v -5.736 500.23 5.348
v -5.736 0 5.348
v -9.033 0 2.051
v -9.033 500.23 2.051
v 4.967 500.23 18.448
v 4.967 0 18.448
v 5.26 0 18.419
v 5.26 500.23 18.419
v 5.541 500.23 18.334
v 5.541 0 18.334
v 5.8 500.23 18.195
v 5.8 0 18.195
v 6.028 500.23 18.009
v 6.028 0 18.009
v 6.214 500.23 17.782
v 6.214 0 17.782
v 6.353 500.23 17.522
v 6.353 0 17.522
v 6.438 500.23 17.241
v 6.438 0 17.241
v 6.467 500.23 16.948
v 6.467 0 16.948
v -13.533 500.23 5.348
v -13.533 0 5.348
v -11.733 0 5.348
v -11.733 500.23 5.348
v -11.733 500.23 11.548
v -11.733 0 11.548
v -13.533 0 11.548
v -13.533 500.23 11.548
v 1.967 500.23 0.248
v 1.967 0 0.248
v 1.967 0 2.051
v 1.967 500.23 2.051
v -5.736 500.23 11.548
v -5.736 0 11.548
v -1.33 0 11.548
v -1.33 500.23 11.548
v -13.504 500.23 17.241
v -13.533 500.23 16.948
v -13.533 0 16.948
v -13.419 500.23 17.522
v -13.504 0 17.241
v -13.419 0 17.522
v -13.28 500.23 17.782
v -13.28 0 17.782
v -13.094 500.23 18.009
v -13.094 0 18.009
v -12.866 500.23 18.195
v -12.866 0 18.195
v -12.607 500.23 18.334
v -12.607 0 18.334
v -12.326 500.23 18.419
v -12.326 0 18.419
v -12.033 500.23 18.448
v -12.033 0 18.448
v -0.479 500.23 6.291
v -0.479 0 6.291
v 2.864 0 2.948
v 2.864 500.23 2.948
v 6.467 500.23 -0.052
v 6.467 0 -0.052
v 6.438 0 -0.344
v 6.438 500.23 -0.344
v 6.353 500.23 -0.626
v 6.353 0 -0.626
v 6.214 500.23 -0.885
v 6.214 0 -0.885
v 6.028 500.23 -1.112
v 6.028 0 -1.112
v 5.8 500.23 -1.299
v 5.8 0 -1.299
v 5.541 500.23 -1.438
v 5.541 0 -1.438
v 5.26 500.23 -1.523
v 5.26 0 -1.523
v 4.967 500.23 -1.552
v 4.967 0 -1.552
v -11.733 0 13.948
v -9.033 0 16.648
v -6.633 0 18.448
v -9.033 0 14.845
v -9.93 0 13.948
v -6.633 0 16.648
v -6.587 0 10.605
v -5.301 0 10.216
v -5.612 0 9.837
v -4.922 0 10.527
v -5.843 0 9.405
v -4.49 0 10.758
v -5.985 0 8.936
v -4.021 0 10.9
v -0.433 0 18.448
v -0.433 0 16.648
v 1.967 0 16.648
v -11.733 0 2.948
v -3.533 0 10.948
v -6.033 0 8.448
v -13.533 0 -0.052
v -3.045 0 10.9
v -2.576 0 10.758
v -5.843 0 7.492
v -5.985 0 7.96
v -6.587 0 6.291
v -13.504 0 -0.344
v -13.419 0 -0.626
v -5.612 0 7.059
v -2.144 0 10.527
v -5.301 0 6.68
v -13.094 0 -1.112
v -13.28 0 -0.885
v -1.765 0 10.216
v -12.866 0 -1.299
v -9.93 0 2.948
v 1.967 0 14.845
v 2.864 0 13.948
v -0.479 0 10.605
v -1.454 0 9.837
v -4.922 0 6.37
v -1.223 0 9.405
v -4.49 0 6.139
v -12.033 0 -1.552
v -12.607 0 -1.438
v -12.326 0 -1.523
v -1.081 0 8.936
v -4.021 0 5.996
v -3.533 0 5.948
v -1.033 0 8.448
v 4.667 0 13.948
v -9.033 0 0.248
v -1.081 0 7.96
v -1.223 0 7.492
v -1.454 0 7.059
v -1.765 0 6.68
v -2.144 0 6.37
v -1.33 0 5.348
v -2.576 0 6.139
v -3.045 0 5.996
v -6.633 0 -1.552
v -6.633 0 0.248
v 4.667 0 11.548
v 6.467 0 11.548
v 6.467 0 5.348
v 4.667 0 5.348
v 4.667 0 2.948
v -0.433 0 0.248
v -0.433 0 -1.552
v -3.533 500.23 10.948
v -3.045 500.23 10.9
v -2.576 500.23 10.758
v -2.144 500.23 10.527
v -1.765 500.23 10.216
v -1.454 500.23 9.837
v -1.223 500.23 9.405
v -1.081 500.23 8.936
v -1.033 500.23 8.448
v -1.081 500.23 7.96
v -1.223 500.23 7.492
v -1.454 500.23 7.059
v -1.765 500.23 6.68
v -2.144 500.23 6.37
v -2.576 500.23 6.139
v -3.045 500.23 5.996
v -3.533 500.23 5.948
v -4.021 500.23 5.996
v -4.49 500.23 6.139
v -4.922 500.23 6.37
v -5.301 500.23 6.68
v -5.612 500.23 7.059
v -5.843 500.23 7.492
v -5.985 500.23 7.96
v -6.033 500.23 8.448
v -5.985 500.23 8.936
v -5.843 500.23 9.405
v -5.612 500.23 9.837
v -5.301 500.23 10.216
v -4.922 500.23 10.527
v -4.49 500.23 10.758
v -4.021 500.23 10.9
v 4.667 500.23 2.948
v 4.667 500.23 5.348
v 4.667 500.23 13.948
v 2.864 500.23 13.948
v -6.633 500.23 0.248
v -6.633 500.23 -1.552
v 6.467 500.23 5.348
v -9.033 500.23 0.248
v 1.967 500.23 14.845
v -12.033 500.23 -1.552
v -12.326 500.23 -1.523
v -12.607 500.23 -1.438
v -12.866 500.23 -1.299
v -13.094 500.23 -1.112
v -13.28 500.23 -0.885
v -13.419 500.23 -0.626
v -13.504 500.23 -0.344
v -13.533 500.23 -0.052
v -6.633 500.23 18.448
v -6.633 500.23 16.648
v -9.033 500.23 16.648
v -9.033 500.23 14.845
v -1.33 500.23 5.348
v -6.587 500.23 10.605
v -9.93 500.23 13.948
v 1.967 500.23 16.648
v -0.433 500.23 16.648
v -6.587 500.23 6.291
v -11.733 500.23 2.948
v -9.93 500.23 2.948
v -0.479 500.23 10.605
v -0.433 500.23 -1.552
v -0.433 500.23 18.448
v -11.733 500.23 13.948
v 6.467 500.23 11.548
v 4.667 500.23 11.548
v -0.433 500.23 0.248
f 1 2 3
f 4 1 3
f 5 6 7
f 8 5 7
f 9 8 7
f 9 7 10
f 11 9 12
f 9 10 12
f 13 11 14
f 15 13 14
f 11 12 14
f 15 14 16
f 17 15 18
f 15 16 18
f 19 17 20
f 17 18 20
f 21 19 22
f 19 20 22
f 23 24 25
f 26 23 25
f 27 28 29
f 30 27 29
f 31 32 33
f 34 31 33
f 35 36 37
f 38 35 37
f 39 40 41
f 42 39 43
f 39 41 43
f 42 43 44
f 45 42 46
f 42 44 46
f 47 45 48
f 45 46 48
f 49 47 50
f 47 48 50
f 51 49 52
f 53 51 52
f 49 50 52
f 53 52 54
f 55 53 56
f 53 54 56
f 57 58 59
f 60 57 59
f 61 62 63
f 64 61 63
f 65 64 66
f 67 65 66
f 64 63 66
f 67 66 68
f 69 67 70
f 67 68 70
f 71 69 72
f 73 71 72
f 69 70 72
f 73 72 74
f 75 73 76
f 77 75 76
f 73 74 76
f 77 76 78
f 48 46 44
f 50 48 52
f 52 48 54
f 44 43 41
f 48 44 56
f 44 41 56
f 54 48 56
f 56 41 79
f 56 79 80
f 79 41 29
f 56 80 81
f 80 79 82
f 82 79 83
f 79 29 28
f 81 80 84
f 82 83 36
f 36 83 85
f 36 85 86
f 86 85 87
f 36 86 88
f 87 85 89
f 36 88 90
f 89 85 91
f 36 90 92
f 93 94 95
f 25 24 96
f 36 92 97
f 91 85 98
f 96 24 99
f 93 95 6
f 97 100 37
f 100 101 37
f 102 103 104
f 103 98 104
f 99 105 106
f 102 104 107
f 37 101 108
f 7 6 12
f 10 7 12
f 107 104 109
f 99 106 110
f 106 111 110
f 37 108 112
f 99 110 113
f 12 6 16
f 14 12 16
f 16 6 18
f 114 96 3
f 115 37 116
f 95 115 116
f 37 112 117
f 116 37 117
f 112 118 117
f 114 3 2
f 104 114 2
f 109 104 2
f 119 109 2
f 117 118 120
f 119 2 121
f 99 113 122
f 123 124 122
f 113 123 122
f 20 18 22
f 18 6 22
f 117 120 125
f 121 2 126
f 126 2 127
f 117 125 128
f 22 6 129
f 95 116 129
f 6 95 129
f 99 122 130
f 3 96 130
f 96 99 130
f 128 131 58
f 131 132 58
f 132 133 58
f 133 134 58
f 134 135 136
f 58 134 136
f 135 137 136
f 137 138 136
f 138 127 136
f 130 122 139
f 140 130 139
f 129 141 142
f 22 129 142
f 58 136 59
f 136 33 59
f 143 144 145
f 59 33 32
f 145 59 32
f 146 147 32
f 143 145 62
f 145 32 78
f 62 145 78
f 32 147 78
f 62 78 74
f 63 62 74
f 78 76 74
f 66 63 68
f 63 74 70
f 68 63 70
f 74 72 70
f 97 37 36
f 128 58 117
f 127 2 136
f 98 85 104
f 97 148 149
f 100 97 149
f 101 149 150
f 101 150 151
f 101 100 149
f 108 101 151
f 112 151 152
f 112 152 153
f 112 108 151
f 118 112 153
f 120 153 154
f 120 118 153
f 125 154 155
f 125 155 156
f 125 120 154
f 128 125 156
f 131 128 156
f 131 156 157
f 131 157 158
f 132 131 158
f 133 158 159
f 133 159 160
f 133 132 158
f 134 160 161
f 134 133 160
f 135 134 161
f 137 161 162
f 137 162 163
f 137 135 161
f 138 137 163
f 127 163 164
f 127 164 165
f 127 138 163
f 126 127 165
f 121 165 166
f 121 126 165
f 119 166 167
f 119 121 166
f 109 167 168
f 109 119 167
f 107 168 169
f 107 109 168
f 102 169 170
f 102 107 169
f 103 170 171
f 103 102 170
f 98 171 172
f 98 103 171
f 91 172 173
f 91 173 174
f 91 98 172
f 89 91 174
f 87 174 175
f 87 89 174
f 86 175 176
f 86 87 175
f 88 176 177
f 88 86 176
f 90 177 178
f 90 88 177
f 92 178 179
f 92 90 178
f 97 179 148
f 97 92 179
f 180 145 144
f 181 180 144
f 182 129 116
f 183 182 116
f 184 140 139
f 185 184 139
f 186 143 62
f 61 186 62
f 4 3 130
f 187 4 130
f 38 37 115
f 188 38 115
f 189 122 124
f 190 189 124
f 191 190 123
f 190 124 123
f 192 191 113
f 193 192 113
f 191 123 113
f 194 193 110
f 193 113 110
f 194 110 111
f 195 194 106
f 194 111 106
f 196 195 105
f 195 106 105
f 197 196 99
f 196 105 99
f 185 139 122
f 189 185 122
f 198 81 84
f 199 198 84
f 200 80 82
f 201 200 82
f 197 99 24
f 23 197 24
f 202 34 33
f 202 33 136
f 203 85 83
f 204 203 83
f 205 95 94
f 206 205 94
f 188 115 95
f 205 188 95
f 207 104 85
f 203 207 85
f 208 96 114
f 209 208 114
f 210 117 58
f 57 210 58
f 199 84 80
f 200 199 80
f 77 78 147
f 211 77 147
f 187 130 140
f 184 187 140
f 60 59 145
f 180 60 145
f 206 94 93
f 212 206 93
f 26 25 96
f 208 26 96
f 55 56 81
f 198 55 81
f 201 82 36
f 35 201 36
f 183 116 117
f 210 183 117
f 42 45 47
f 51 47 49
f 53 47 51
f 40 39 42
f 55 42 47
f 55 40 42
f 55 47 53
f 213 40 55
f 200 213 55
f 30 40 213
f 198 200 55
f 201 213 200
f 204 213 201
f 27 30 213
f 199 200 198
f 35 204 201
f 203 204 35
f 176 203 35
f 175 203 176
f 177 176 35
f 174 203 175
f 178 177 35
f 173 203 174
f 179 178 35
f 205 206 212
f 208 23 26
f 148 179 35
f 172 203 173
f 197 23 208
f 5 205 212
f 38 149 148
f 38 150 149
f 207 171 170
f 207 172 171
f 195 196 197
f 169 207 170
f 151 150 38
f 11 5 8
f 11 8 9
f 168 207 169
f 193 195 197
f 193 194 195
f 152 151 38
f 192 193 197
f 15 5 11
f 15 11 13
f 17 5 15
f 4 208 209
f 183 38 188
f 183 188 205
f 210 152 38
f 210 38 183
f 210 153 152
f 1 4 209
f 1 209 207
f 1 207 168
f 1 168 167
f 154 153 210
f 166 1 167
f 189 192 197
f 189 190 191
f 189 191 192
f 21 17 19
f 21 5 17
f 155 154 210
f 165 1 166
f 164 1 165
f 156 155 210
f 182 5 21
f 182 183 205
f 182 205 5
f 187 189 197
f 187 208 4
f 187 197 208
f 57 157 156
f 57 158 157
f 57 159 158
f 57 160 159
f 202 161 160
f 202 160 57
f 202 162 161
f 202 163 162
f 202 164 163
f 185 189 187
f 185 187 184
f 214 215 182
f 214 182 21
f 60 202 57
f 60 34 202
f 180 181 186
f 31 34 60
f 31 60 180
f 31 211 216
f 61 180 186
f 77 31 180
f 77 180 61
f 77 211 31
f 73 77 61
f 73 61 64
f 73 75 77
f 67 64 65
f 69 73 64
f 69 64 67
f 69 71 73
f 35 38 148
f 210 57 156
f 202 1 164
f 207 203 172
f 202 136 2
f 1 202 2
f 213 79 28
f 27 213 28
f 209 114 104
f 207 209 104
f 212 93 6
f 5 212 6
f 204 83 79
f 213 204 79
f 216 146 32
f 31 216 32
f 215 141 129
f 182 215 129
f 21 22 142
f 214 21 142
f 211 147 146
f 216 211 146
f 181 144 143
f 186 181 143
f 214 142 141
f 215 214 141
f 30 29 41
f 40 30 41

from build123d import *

# Parameters (mm, degrees)
SKETCH_1_R      = 2.5
EXTRUDE_1_DEPTH = 500.23


with BuildPart() as part:
    # 草图1 → 凸台-拉伸1 (new body)
    with BuildSketch(Plane(origin=(0, 0, 0), x_dir=(1, 0, 0), z_dir=(0, 1, 0))):
        with BuildLine():
            Line((-11.732893528, -11.548223653), (-13.532893528, -11.548223653))
            Line((-13.532893528, -11.548223653), (-13.532893528, -16.948223653))
            ThreePointArc((-13.532893528, -16.948223653), (-13.093553699, -18.008883825), (-12.032893528, -18.448223653))
            Line((-12.032893528, -18.448223653), (-6.632893528, -18.448223653))
            Line((-6.632893528, -18.448223653), (-6.632893528, -16.648223653))
            Line((-6.632893528, -16.648223653), (-9.032893528, -16.648223653))
            Line((-9.032893528, -16.648223653), (-9.032893528, -14.845273808))
            Line((-9.032893528, -14.845273808), (-5.735843372, -11.548223653))
            Line((-5.735843372, -11.548223653), (-1.329943683, -11.548223653))
            Line((-1.329943683, -11.548223653), (1.967106472, -14.845273808))
            Line((1.967106472, -14.845273808), (1.967106472, -16.648223653))
            Line((1.967106472, -16.648223653), (-0.432893528, -16.648223653))
            Line((-0.432893528, -16.648223653), (-0.432893528, -18.448223653))
            Line((-0.432893528, -18.448223653), (4.967106472, -18.448223653))
            ThreePointArc((4.967106472, -18.448223653), (6.027766644, -18.008883825), (6.467106472, -16.948223653))
            Line((6.467106472, -16.948223653), (6.467106472, -11.548223653))
            Line((6.467106472, -11.548223653), (4.667106472, -11.548223653))
            Line((4.667106472, -11.548223653), (4.667106472, -13.948223653))
            Line((4.667106472, -13.948223653), (2.864156628, -13.948223653))
            Line((2.864156628, -13.948223653), (-0.478766507, -10.605300518))
            Line((-0.478766507, -10.605300518), (-0.478766507, -6.291146788))
            Line((-0.478766507, -6.291146788), (2.864156628, -2.948223653))
            Line((2.864156628, -2.948223653), (4.667106472, -2.948223653))
            Line((4.667106472, -2.948223653), (4.667106472, -5.348223653))
            Line((4.667106472, -5.348223653), (6.467106472, -5.348223653))
            Line((6.467106472, -5.348223653), (6.467106472, 0.051776347))
            ThreePointArc((6.467106472, 0.051776347), (6.027766644, 1.112436519), (4.967106472, 1.551776347))
            Line((4.967106472, 1.551776347), (-0.432893528, 1.551776347))
            Line((-0.432893528, 1.551776347), (-0.432893528, -0.248223653))
            Line((-0.432893528, -0.248223653), (1.967106472, -0.248223653))
            Line((1.967106472, -0.248223653), (1.967106472, -2.051173498))
            Line((1.967106472, -2.051173498), (-1.329943683, -5.348223653))
            Line((-1.329943683, -5.348223653), (-5.735843372, -5.348223653))
            Line((-5.735843372, -5.348223653), (-9.032893528, -2.051173498))
            Line((-9.032893528, -2.051173498), (-9.032893528, -0.248223653))
            Line((-9.032893528, -0.248223653), (-6.632893528, -0.248223653))
            Line((-6.632893528, -0.248223653), (-6.632893528, 1.551776347))
            Line((-6.632893528, 1.551776347), (-12.032893528, 1.551776347))
            ThreePointArc((-12.032893528, 1.551776347), (-13.093553699, 1.112436519), (-13.532893528, 0.051776347))
            Line((-13.532893528, 0.051776347), (-13.532893528, -5.348223653))
            Line((-13.532893528, -5.348223653), (-11.732893528, -5.348223653))
            Line((-11.732893528, -5.348223653), (-11.732893528, -2.948223653))
            Line((-11.732893528, -2.948223653), (-9.929943683, -2.948223653))
            Line((-9.929943683, -2.948223653), (-6.587020548, -6.291146788))
            Line((-6.587020548, -6.291146788), (-6.587020548, -10.605300518))
            Line((-6.587020548, -10.605300518), (-9.929943683, -13.948223653))
            Line((-9.929943683, -13.948223653), (-11.732893528, -13.948223653))
            Line((-11.732893528, -13.948223653), (-11.732893528, -11.548223653))
        make_face()
        with Locations(Location((-3.532893528, -8.448223653, 0), (0, 0, 270))):
            Circle(SKETCH_1_R, mode=Mode.SUBTRACT)
    extrude(amount=EXTRUDE_1_DEPTH)


solid = part.part
